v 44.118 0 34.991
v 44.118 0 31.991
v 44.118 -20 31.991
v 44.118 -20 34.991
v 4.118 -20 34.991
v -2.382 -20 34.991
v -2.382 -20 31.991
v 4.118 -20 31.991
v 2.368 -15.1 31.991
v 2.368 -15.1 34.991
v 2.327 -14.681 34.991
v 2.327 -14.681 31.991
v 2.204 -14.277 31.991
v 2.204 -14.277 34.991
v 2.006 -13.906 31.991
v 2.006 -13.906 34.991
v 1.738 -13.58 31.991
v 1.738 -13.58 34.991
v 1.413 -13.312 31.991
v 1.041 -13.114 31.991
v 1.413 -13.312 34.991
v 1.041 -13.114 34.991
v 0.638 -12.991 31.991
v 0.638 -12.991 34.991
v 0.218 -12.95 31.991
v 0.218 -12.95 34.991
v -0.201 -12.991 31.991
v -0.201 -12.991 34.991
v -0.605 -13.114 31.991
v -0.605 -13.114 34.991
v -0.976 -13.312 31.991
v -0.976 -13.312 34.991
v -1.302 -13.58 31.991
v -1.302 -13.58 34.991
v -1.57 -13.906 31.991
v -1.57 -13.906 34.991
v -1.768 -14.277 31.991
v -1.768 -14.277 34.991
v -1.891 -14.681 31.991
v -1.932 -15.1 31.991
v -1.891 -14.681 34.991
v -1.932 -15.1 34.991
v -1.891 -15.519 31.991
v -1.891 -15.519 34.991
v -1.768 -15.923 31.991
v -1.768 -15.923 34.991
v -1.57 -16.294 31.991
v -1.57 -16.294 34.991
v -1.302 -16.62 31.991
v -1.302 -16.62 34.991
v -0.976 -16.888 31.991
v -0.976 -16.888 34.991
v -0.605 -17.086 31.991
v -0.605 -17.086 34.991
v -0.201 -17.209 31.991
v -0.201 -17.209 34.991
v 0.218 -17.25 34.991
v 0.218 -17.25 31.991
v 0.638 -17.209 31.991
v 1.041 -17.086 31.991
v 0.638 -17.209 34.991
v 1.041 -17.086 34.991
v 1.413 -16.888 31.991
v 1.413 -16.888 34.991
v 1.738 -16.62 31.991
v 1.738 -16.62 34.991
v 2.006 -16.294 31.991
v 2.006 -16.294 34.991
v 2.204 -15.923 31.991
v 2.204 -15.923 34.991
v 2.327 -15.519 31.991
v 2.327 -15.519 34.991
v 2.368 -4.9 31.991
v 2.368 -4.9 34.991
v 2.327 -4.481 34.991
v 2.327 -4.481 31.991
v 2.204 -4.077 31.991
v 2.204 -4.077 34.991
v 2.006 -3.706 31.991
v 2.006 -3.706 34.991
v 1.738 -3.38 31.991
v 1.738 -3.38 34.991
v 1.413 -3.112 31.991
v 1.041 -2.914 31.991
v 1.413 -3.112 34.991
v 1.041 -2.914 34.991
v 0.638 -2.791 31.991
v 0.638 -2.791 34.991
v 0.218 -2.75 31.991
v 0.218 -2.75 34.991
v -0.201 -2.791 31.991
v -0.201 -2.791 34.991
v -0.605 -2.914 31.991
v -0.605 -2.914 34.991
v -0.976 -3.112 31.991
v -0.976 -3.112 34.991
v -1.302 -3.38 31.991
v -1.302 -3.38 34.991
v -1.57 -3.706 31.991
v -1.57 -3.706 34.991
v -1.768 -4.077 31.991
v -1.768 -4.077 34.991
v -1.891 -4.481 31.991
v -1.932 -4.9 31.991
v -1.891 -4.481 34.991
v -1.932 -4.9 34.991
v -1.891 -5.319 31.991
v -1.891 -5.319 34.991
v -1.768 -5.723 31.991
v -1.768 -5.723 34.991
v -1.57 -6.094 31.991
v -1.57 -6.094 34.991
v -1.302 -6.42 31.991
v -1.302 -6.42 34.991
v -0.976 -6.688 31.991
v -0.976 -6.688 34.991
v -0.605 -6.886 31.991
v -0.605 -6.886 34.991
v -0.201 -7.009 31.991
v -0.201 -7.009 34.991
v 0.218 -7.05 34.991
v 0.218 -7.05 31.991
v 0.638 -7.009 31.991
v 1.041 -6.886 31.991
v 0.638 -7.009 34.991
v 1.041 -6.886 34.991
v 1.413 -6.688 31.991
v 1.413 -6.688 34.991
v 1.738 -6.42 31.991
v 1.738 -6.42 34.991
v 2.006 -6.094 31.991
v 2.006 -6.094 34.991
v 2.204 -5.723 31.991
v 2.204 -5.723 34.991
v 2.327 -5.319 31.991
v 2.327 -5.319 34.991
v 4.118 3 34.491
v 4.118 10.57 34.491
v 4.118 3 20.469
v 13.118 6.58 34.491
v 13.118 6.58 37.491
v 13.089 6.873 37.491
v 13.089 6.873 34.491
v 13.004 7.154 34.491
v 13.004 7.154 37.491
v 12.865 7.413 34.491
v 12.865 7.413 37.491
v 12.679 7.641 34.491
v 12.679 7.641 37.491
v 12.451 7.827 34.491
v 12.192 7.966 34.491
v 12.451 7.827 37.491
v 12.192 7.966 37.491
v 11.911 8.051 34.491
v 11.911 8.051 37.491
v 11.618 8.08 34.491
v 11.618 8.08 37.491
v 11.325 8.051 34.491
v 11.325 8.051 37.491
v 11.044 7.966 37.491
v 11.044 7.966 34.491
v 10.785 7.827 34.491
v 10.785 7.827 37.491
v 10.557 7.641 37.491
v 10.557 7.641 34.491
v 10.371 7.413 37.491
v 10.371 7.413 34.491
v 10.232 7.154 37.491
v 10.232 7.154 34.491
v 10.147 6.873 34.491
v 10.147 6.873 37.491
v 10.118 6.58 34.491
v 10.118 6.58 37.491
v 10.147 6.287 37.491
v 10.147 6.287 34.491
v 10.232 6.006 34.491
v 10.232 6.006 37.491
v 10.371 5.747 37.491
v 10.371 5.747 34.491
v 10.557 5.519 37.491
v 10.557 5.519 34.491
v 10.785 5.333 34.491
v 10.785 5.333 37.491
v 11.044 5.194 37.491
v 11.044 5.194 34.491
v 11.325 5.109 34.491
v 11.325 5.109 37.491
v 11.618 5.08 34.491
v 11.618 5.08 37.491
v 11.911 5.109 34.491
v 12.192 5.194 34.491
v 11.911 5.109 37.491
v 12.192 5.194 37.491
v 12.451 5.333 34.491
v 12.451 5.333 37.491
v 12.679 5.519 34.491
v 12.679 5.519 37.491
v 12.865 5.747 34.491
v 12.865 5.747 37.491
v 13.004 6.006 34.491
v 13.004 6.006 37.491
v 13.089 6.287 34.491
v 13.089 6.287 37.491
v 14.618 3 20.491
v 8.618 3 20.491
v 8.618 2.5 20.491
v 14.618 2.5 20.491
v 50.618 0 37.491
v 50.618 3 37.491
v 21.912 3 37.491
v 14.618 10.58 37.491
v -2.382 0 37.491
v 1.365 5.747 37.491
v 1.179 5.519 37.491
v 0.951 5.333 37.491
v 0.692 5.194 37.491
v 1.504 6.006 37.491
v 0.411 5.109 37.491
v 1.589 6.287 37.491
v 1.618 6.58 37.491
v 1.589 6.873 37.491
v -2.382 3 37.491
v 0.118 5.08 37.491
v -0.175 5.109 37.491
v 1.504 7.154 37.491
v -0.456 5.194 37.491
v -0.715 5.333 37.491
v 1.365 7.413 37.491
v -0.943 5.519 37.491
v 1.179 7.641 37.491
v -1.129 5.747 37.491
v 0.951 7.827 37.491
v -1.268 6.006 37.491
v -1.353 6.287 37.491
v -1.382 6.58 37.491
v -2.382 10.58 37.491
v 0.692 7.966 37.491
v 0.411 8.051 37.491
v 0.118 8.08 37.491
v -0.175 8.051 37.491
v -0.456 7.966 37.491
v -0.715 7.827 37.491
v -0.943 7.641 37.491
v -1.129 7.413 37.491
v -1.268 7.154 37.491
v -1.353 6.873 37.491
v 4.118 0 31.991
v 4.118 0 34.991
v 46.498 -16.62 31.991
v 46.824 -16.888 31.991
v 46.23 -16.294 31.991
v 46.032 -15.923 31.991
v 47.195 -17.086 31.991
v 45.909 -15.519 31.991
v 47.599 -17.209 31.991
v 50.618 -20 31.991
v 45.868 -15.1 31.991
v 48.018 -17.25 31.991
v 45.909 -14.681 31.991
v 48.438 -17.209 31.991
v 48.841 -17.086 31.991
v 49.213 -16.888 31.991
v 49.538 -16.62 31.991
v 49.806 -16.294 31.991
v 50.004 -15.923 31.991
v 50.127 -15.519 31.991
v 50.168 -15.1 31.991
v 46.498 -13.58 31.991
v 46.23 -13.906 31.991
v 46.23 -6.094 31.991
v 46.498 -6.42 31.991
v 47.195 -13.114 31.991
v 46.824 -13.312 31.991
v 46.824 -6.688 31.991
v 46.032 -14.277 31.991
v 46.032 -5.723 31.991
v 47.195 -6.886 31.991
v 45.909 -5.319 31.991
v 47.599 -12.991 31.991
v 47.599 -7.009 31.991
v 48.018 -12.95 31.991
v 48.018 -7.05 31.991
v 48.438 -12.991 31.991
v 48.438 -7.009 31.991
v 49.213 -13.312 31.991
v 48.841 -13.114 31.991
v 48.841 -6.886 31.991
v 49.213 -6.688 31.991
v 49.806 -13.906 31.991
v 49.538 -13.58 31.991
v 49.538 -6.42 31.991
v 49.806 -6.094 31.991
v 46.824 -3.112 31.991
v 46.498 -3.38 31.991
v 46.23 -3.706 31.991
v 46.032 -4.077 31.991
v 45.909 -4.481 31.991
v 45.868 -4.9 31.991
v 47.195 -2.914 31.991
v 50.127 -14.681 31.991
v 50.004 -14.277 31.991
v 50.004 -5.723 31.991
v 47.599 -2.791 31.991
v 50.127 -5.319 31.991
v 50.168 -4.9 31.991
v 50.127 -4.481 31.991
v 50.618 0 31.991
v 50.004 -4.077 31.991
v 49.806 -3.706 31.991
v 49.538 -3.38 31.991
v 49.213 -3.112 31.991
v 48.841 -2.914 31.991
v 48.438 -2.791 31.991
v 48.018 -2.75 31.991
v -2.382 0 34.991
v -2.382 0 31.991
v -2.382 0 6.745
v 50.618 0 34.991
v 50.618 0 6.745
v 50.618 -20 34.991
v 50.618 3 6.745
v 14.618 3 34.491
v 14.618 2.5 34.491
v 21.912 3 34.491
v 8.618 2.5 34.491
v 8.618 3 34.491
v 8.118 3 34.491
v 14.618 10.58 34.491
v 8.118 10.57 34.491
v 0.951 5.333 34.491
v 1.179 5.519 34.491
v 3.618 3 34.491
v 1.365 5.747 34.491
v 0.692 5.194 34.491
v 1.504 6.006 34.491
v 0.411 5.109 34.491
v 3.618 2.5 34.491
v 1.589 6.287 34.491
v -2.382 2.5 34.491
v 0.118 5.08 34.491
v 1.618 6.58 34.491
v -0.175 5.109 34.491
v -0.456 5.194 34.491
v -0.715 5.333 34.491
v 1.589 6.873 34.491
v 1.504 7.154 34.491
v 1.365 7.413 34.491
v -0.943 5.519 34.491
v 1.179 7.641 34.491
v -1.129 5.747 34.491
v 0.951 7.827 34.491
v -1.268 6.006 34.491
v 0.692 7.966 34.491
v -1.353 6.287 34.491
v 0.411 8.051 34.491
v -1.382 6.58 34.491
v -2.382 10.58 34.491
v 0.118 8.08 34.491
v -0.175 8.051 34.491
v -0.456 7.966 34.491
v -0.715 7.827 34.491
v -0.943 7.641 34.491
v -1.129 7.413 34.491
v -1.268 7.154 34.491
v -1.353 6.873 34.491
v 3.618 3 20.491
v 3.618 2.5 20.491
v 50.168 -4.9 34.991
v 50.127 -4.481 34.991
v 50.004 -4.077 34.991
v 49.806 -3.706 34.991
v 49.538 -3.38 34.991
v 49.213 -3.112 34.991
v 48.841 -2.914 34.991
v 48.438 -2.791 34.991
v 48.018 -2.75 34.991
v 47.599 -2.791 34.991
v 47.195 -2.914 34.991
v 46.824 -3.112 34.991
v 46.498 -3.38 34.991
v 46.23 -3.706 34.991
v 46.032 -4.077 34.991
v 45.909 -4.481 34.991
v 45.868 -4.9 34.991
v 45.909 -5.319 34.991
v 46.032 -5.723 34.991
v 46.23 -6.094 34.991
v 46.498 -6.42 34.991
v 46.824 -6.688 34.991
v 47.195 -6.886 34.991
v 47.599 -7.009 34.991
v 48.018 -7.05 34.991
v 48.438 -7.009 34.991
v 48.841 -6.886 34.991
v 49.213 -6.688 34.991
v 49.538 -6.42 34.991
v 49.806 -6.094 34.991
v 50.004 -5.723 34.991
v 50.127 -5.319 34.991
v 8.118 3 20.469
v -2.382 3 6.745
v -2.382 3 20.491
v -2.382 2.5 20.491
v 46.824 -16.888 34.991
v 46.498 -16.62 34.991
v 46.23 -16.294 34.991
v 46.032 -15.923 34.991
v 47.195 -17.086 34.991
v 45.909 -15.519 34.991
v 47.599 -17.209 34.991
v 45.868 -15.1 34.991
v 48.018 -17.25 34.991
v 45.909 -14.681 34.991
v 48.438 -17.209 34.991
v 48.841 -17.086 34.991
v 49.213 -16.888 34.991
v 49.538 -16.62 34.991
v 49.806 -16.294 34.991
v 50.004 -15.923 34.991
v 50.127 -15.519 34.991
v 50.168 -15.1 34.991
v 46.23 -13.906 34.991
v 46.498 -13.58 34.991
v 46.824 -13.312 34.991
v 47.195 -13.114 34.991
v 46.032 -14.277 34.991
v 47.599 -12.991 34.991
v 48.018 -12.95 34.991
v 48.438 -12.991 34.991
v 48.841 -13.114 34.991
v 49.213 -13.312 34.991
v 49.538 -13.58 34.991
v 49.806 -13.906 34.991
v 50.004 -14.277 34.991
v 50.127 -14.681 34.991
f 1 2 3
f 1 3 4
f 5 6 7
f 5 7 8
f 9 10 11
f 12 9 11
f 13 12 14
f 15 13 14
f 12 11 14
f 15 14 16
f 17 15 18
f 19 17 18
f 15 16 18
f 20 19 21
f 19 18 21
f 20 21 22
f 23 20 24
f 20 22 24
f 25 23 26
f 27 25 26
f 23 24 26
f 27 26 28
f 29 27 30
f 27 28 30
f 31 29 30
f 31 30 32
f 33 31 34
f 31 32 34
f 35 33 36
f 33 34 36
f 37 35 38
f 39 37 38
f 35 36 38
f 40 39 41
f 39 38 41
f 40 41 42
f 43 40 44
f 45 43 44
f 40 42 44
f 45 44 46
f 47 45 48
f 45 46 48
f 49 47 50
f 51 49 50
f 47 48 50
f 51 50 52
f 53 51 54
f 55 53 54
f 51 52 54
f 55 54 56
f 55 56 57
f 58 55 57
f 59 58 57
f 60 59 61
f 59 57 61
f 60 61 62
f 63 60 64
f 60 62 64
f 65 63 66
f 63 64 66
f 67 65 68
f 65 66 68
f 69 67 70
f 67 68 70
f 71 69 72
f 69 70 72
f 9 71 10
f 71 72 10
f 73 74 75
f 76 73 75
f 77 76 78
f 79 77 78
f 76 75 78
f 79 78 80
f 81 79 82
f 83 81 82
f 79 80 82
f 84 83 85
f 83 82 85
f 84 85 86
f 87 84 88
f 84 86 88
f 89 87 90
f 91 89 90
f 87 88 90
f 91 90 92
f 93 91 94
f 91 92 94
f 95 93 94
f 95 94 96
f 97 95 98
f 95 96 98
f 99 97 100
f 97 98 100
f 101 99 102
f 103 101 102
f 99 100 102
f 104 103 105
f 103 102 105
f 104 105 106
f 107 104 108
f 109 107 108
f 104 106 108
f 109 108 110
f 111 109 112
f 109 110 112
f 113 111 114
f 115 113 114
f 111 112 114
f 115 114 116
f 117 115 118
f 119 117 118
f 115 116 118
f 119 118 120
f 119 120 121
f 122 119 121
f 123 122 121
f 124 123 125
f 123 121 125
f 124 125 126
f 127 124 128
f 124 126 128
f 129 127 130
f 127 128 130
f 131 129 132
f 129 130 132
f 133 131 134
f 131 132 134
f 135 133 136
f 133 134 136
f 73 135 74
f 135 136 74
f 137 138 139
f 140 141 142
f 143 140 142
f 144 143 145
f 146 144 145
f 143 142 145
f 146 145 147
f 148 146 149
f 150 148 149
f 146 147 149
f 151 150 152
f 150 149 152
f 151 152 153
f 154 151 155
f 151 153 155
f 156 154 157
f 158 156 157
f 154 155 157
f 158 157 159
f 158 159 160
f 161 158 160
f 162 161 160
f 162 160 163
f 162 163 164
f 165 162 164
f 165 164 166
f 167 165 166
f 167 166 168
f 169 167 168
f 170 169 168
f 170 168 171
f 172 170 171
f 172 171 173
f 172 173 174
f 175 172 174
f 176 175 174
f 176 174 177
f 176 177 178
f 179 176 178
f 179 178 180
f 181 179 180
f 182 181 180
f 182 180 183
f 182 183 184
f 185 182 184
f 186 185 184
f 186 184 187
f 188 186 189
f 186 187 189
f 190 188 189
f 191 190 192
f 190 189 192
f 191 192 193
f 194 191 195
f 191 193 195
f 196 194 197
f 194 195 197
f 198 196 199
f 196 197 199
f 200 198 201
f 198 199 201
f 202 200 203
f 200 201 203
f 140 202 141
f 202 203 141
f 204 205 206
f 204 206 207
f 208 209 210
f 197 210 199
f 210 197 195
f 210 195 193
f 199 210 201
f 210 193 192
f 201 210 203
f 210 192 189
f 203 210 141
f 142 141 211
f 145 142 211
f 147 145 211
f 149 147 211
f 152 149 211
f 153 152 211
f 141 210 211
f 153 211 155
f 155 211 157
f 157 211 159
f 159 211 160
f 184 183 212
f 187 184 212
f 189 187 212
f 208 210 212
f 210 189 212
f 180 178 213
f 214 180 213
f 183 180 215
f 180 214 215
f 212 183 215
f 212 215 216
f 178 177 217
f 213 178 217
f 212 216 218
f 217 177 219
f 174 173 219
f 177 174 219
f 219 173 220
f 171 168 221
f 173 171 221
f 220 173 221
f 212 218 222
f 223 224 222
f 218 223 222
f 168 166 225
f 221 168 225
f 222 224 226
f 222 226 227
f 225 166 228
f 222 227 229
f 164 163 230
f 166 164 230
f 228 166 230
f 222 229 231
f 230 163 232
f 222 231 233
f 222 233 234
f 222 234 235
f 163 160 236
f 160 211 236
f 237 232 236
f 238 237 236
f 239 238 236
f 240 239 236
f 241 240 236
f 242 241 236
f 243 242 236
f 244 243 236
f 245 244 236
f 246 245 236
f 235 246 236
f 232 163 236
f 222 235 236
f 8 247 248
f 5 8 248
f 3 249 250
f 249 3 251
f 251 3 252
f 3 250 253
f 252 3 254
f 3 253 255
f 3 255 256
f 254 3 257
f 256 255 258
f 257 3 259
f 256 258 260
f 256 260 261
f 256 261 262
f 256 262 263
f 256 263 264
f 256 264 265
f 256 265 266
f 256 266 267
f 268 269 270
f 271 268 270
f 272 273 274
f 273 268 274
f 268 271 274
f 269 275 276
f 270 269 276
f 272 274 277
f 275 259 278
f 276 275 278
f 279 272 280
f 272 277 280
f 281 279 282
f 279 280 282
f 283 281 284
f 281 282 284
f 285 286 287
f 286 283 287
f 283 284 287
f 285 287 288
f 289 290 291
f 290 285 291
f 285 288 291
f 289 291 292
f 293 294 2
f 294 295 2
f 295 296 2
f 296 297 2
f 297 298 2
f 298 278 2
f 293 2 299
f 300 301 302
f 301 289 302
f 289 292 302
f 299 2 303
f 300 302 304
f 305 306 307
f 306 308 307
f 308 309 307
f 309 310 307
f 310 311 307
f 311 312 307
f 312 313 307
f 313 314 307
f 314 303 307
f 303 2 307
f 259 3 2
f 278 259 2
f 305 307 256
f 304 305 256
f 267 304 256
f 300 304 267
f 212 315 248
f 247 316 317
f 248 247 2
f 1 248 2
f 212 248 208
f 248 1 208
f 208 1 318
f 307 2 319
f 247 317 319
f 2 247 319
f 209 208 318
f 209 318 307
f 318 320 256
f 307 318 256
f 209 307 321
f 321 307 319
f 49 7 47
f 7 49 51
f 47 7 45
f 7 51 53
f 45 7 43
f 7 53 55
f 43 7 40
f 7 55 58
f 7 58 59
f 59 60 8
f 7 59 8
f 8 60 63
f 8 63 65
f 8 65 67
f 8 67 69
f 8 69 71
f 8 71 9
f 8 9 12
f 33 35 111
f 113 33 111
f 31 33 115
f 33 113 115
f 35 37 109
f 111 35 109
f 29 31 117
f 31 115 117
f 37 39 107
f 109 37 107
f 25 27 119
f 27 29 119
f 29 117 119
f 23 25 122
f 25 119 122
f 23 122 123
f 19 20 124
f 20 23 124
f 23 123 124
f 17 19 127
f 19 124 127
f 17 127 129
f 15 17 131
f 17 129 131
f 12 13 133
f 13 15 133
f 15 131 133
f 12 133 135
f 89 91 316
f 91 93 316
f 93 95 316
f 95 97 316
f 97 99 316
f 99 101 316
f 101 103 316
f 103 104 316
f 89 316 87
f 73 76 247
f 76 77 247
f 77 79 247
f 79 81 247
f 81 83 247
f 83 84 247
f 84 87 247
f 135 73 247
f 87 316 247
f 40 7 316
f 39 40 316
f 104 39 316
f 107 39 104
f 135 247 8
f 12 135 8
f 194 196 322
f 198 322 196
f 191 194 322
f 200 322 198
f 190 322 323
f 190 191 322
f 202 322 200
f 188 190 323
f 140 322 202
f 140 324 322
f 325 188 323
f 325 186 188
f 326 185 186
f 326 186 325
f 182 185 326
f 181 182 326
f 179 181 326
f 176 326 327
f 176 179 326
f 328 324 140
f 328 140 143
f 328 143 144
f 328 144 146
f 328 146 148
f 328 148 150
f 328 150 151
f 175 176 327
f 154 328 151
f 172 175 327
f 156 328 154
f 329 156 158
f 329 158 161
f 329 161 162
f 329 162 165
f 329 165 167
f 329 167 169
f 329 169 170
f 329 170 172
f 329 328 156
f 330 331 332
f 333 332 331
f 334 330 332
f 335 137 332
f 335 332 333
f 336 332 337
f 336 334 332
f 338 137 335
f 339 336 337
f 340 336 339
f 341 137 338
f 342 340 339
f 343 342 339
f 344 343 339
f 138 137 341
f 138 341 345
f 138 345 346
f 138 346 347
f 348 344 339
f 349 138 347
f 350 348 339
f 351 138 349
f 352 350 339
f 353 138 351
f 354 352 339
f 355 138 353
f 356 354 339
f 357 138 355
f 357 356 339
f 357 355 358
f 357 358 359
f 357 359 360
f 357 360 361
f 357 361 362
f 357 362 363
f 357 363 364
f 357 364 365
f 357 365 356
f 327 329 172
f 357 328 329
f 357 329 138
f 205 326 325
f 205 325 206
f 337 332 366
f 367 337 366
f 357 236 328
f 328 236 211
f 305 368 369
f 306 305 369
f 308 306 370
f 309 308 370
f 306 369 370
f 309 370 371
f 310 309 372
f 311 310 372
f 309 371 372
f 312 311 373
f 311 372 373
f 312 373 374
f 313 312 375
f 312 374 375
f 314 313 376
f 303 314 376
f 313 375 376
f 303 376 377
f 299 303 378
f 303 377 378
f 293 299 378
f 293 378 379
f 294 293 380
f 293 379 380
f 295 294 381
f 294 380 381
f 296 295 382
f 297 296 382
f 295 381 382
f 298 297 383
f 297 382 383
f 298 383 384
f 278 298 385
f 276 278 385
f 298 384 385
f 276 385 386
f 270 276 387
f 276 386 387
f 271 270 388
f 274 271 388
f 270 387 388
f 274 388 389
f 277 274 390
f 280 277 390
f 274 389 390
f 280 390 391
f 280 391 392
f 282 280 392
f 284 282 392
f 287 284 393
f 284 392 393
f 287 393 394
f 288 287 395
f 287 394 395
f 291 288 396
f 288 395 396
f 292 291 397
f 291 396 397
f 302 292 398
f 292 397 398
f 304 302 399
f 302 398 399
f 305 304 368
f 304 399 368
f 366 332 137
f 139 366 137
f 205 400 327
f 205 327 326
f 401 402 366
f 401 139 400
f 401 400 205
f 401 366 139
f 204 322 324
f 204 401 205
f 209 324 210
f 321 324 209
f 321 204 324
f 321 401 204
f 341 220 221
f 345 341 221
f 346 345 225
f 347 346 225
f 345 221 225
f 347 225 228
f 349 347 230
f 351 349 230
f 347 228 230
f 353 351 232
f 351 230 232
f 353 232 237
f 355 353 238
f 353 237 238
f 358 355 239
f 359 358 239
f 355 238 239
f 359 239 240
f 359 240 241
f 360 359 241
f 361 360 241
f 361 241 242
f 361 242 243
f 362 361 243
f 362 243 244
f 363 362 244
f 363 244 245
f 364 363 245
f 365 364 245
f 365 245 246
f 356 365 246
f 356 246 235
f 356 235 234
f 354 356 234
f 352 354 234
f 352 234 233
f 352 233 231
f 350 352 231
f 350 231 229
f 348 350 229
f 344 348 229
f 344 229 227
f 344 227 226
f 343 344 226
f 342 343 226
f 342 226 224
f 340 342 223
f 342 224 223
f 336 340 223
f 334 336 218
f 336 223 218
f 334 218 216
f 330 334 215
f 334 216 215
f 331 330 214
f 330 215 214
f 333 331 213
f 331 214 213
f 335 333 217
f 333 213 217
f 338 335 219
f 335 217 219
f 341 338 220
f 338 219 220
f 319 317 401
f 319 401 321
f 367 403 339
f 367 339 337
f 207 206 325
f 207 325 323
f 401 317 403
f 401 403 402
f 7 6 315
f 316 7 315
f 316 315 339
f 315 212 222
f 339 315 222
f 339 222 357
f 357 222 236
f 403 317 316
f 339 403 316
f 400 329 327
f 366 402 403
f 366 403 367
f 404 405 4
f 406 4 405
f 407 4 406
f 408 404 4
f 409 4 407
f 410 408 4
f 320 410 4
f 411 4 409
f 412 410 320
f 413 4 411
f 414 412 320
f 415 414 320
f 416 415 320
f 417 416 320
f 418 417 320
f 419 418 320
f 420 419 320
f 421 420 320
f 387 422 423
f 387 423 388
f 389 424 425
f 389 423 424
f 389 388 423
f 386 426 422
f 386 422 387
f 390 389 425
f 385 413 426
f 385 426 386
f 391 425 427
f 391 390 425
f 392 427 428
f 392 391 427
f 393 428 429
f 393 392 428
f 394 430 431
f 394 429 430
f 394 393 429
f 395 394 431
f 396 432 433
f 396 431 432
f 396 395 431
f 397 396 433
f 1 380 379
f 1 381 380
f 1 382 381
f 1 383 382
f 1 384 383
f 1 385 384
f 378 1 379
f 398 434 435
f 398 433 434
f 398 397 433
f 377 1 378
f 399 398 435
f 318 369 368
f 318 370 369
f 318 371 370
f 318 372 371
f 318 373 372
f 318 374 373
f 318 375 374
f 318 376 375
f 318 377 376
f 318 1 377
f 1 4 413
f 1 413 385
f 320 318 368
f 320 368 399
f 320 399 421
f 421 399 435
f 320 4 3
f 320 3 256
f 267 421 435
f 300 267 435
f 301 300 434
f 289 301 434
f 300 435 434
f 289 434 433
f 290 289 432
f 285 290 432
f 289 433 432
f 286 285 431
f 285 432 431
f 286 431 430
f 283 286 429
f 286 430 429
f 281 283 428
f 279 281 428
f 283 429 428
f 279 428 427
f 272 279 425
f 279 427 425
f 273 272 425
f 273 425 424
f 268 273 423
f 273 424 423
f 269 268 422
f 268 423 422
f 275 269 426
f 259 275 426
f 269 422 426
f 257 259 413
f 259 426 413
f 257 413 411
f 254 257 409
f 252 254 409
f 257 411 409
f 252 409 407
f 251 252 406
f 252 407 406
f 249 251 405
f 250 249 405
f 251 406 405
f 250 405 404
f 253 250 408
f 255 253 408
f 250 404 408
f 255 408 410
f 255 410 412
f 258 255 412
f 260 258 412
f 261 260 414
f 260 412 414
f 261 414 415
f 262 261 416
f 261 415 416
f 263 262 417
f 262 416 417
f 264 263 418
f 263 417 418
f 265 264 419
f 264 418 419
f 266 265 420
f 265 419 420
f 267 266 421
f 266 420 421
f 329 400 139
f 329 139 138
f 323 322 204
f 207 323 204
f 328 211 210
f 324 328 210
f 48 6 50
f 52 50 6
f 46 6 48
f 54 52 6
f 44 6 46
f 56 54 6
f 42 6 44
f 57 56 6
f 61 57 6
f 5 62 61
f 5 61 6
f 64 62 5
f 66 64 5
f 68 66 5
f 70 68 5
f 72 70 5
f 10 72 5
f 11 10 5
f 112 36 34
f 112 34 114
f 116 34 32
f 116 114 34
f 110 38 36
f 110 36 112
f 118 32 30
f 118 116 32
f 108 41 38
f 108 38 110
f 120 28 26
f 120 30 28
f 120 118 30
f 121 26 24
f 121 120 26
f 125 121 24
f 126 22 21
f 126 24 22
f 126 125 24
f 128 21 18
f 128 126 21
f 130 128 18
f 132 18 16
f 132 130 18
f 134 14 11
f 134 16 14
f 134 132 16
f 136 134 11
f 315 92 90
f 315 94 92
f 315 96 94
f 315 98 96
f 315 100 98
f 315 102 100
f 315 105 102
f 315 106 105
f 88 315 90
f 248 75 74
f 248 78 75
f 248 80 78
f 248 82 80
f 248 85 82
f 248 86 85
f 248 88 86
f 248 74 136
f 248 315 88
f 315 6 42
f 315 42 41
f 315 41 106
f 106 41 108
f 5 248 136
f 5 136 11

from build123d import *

# Parameters (mm, degrees)
SKETCH1_W                = 53
SKETCH1_H                = 30.745586227
BOSS_EXTRUDE1_DEPTH      = 3
SKETCH2_W                = 6.5
SKETCH2_H                = 3
BOSS_EXTRUDE2_DEPTH      = 20
SKETCH3_R                = 2.15
CUT_EXTRUDE1_DEPTH       = 3
SKETCH6_W                = 17
SKETCH6_H                = 7.58
BOSS_EXTRUDE3_DEPTH      = 3
SKETCH7_R                = 1.5
CUT_EXTRUDE2_DEPTH       = 7.5
SKETCH8_W                = 6
SKETCH8_H                = 14
CUT_EXTRUDE3_DEPTH       = 0.5
BOSS_EXTRUDE4_DEPTH      = 2
BOSS_EXTRUDE4_DEPTH_BACK = 2
BOSS_EXTRUDE5_DEPTH      = 3


with BuildPart() as part:
    # Sketch1 → Boss-Extrude1 (new body)
    with BuildSketch(Plane(origin=(0, 0, 0), x_dir=(1, 0, 0), z_dir=(0, 1, 0))):
        with Locations((24.118089155, -22.118099476)):
            Rectangle(SKETCH1_W, SKETCH1_H)
    extrude(amount=BOSS_EXTRUDE1_DEPTH)

    # Sketch2 → Boss-Extrude2 (add)
    with BuildSketch(Plane.XZ):
        with Locations((47.368089155, 33.49089259)):
            Rectangle(SKETCH2_W, SKETCH2_H)
        with Locations((0.868089155, 33.49089259)):
            Rectangle(SKETCH2_W, SKETCH2_H)
    extrude(amount=BOSS_EXTRUDE2_DEPTH)

    # Sketch3 → Cut-Extrude1 (cut)
    with BuildSketch(Plane.XY.offset(34.99089259)):
        with Locations((48.018089155, -15.1)):
            Circle(SKETCH3_R)
        with Locations((48.018089155, -4.9)):
            Circle(SKETCH3_R)
        with Locations((0.218089155, -15.1)):
            Circle(SKETCH3_R)
        with Locations((0.218089155, -4.9)):
            Circle(SKETCH3_R)
    extrude(amount=-CUT_EXTRUDE1_DEPTH, mode=Mode.SUBTRACT)

    # Sketch6 → Boss-Extrude3 (add)
    with BuildSketch(Plane.XY.offset(37.49089259)):
        with Locations((6.118089155, 6.79)):
            Rectangle(SKETCH6_W, SKETCH6_H)
    extrude(amount=-BOSS_EXTRUDE3_DEPTH)

    # Sketch7 → Cut-Extrude2 (cut)
    with BuildSketch(Plane.XY.offset(37.49089259)):
        with Locations((0.118089155, 6.58)):
            Circle(SKETCH7_R)
        with Locations((11.618089155, 6.58)):
            Circle(SKETCH7_R)
    extrude(amount=-CUT_EXTRUDE2_DEPTH, mode=Mode.SUBTRACT)

    # Sketch8 → Cut-Extrude3 (cut)
    with BuildSketch(Plane(origin=(0, 3, 0), x_dir=(1, 0, 0), z_dir=(0, 1, 0))):
        with Locations((11.618089155, -27.49089259)):
            Rectangle(SKETCH8_W, SKETCH8_H)
        with Locations((0.618089155, -27.49089259)):
            Rectangle(SKETCH8_W, SKETCH8_H)
    extrude(amount=-CUT_EXTRUDE3_DEPTH, mode=Mode.SUBTRACT)

    # Sketch13 → Boss-Extrude4 (add, two sides: drawn at the far end of the back side and taken through both)
    with BuildSketch(Plane.ZY.offset(-6.118089155).offset(-BOSS_EXTRUDE4_DEPTH_BACK)):
        Polygon((34.49089259, 10.57033397), (34.49089259, 3), (20.468920989, 3), align=None)
    extrude(amount=BOSS_EXTRUDE4_DEPTH + BOSS_EXTRUDE4_DEPTH_BACK)

    # Sketch14 → Boss-Extrude5 (add)
    with BuildSketch(Plane.XY.offset(37.49089259)):
        Polygon((14.618089155, 3), (14.618089155, 10.58), (21.91210821, 3), align=None)
    extrude(amount=-BOSS_EXTRUDE5_DEPTH)


solid = part.part
